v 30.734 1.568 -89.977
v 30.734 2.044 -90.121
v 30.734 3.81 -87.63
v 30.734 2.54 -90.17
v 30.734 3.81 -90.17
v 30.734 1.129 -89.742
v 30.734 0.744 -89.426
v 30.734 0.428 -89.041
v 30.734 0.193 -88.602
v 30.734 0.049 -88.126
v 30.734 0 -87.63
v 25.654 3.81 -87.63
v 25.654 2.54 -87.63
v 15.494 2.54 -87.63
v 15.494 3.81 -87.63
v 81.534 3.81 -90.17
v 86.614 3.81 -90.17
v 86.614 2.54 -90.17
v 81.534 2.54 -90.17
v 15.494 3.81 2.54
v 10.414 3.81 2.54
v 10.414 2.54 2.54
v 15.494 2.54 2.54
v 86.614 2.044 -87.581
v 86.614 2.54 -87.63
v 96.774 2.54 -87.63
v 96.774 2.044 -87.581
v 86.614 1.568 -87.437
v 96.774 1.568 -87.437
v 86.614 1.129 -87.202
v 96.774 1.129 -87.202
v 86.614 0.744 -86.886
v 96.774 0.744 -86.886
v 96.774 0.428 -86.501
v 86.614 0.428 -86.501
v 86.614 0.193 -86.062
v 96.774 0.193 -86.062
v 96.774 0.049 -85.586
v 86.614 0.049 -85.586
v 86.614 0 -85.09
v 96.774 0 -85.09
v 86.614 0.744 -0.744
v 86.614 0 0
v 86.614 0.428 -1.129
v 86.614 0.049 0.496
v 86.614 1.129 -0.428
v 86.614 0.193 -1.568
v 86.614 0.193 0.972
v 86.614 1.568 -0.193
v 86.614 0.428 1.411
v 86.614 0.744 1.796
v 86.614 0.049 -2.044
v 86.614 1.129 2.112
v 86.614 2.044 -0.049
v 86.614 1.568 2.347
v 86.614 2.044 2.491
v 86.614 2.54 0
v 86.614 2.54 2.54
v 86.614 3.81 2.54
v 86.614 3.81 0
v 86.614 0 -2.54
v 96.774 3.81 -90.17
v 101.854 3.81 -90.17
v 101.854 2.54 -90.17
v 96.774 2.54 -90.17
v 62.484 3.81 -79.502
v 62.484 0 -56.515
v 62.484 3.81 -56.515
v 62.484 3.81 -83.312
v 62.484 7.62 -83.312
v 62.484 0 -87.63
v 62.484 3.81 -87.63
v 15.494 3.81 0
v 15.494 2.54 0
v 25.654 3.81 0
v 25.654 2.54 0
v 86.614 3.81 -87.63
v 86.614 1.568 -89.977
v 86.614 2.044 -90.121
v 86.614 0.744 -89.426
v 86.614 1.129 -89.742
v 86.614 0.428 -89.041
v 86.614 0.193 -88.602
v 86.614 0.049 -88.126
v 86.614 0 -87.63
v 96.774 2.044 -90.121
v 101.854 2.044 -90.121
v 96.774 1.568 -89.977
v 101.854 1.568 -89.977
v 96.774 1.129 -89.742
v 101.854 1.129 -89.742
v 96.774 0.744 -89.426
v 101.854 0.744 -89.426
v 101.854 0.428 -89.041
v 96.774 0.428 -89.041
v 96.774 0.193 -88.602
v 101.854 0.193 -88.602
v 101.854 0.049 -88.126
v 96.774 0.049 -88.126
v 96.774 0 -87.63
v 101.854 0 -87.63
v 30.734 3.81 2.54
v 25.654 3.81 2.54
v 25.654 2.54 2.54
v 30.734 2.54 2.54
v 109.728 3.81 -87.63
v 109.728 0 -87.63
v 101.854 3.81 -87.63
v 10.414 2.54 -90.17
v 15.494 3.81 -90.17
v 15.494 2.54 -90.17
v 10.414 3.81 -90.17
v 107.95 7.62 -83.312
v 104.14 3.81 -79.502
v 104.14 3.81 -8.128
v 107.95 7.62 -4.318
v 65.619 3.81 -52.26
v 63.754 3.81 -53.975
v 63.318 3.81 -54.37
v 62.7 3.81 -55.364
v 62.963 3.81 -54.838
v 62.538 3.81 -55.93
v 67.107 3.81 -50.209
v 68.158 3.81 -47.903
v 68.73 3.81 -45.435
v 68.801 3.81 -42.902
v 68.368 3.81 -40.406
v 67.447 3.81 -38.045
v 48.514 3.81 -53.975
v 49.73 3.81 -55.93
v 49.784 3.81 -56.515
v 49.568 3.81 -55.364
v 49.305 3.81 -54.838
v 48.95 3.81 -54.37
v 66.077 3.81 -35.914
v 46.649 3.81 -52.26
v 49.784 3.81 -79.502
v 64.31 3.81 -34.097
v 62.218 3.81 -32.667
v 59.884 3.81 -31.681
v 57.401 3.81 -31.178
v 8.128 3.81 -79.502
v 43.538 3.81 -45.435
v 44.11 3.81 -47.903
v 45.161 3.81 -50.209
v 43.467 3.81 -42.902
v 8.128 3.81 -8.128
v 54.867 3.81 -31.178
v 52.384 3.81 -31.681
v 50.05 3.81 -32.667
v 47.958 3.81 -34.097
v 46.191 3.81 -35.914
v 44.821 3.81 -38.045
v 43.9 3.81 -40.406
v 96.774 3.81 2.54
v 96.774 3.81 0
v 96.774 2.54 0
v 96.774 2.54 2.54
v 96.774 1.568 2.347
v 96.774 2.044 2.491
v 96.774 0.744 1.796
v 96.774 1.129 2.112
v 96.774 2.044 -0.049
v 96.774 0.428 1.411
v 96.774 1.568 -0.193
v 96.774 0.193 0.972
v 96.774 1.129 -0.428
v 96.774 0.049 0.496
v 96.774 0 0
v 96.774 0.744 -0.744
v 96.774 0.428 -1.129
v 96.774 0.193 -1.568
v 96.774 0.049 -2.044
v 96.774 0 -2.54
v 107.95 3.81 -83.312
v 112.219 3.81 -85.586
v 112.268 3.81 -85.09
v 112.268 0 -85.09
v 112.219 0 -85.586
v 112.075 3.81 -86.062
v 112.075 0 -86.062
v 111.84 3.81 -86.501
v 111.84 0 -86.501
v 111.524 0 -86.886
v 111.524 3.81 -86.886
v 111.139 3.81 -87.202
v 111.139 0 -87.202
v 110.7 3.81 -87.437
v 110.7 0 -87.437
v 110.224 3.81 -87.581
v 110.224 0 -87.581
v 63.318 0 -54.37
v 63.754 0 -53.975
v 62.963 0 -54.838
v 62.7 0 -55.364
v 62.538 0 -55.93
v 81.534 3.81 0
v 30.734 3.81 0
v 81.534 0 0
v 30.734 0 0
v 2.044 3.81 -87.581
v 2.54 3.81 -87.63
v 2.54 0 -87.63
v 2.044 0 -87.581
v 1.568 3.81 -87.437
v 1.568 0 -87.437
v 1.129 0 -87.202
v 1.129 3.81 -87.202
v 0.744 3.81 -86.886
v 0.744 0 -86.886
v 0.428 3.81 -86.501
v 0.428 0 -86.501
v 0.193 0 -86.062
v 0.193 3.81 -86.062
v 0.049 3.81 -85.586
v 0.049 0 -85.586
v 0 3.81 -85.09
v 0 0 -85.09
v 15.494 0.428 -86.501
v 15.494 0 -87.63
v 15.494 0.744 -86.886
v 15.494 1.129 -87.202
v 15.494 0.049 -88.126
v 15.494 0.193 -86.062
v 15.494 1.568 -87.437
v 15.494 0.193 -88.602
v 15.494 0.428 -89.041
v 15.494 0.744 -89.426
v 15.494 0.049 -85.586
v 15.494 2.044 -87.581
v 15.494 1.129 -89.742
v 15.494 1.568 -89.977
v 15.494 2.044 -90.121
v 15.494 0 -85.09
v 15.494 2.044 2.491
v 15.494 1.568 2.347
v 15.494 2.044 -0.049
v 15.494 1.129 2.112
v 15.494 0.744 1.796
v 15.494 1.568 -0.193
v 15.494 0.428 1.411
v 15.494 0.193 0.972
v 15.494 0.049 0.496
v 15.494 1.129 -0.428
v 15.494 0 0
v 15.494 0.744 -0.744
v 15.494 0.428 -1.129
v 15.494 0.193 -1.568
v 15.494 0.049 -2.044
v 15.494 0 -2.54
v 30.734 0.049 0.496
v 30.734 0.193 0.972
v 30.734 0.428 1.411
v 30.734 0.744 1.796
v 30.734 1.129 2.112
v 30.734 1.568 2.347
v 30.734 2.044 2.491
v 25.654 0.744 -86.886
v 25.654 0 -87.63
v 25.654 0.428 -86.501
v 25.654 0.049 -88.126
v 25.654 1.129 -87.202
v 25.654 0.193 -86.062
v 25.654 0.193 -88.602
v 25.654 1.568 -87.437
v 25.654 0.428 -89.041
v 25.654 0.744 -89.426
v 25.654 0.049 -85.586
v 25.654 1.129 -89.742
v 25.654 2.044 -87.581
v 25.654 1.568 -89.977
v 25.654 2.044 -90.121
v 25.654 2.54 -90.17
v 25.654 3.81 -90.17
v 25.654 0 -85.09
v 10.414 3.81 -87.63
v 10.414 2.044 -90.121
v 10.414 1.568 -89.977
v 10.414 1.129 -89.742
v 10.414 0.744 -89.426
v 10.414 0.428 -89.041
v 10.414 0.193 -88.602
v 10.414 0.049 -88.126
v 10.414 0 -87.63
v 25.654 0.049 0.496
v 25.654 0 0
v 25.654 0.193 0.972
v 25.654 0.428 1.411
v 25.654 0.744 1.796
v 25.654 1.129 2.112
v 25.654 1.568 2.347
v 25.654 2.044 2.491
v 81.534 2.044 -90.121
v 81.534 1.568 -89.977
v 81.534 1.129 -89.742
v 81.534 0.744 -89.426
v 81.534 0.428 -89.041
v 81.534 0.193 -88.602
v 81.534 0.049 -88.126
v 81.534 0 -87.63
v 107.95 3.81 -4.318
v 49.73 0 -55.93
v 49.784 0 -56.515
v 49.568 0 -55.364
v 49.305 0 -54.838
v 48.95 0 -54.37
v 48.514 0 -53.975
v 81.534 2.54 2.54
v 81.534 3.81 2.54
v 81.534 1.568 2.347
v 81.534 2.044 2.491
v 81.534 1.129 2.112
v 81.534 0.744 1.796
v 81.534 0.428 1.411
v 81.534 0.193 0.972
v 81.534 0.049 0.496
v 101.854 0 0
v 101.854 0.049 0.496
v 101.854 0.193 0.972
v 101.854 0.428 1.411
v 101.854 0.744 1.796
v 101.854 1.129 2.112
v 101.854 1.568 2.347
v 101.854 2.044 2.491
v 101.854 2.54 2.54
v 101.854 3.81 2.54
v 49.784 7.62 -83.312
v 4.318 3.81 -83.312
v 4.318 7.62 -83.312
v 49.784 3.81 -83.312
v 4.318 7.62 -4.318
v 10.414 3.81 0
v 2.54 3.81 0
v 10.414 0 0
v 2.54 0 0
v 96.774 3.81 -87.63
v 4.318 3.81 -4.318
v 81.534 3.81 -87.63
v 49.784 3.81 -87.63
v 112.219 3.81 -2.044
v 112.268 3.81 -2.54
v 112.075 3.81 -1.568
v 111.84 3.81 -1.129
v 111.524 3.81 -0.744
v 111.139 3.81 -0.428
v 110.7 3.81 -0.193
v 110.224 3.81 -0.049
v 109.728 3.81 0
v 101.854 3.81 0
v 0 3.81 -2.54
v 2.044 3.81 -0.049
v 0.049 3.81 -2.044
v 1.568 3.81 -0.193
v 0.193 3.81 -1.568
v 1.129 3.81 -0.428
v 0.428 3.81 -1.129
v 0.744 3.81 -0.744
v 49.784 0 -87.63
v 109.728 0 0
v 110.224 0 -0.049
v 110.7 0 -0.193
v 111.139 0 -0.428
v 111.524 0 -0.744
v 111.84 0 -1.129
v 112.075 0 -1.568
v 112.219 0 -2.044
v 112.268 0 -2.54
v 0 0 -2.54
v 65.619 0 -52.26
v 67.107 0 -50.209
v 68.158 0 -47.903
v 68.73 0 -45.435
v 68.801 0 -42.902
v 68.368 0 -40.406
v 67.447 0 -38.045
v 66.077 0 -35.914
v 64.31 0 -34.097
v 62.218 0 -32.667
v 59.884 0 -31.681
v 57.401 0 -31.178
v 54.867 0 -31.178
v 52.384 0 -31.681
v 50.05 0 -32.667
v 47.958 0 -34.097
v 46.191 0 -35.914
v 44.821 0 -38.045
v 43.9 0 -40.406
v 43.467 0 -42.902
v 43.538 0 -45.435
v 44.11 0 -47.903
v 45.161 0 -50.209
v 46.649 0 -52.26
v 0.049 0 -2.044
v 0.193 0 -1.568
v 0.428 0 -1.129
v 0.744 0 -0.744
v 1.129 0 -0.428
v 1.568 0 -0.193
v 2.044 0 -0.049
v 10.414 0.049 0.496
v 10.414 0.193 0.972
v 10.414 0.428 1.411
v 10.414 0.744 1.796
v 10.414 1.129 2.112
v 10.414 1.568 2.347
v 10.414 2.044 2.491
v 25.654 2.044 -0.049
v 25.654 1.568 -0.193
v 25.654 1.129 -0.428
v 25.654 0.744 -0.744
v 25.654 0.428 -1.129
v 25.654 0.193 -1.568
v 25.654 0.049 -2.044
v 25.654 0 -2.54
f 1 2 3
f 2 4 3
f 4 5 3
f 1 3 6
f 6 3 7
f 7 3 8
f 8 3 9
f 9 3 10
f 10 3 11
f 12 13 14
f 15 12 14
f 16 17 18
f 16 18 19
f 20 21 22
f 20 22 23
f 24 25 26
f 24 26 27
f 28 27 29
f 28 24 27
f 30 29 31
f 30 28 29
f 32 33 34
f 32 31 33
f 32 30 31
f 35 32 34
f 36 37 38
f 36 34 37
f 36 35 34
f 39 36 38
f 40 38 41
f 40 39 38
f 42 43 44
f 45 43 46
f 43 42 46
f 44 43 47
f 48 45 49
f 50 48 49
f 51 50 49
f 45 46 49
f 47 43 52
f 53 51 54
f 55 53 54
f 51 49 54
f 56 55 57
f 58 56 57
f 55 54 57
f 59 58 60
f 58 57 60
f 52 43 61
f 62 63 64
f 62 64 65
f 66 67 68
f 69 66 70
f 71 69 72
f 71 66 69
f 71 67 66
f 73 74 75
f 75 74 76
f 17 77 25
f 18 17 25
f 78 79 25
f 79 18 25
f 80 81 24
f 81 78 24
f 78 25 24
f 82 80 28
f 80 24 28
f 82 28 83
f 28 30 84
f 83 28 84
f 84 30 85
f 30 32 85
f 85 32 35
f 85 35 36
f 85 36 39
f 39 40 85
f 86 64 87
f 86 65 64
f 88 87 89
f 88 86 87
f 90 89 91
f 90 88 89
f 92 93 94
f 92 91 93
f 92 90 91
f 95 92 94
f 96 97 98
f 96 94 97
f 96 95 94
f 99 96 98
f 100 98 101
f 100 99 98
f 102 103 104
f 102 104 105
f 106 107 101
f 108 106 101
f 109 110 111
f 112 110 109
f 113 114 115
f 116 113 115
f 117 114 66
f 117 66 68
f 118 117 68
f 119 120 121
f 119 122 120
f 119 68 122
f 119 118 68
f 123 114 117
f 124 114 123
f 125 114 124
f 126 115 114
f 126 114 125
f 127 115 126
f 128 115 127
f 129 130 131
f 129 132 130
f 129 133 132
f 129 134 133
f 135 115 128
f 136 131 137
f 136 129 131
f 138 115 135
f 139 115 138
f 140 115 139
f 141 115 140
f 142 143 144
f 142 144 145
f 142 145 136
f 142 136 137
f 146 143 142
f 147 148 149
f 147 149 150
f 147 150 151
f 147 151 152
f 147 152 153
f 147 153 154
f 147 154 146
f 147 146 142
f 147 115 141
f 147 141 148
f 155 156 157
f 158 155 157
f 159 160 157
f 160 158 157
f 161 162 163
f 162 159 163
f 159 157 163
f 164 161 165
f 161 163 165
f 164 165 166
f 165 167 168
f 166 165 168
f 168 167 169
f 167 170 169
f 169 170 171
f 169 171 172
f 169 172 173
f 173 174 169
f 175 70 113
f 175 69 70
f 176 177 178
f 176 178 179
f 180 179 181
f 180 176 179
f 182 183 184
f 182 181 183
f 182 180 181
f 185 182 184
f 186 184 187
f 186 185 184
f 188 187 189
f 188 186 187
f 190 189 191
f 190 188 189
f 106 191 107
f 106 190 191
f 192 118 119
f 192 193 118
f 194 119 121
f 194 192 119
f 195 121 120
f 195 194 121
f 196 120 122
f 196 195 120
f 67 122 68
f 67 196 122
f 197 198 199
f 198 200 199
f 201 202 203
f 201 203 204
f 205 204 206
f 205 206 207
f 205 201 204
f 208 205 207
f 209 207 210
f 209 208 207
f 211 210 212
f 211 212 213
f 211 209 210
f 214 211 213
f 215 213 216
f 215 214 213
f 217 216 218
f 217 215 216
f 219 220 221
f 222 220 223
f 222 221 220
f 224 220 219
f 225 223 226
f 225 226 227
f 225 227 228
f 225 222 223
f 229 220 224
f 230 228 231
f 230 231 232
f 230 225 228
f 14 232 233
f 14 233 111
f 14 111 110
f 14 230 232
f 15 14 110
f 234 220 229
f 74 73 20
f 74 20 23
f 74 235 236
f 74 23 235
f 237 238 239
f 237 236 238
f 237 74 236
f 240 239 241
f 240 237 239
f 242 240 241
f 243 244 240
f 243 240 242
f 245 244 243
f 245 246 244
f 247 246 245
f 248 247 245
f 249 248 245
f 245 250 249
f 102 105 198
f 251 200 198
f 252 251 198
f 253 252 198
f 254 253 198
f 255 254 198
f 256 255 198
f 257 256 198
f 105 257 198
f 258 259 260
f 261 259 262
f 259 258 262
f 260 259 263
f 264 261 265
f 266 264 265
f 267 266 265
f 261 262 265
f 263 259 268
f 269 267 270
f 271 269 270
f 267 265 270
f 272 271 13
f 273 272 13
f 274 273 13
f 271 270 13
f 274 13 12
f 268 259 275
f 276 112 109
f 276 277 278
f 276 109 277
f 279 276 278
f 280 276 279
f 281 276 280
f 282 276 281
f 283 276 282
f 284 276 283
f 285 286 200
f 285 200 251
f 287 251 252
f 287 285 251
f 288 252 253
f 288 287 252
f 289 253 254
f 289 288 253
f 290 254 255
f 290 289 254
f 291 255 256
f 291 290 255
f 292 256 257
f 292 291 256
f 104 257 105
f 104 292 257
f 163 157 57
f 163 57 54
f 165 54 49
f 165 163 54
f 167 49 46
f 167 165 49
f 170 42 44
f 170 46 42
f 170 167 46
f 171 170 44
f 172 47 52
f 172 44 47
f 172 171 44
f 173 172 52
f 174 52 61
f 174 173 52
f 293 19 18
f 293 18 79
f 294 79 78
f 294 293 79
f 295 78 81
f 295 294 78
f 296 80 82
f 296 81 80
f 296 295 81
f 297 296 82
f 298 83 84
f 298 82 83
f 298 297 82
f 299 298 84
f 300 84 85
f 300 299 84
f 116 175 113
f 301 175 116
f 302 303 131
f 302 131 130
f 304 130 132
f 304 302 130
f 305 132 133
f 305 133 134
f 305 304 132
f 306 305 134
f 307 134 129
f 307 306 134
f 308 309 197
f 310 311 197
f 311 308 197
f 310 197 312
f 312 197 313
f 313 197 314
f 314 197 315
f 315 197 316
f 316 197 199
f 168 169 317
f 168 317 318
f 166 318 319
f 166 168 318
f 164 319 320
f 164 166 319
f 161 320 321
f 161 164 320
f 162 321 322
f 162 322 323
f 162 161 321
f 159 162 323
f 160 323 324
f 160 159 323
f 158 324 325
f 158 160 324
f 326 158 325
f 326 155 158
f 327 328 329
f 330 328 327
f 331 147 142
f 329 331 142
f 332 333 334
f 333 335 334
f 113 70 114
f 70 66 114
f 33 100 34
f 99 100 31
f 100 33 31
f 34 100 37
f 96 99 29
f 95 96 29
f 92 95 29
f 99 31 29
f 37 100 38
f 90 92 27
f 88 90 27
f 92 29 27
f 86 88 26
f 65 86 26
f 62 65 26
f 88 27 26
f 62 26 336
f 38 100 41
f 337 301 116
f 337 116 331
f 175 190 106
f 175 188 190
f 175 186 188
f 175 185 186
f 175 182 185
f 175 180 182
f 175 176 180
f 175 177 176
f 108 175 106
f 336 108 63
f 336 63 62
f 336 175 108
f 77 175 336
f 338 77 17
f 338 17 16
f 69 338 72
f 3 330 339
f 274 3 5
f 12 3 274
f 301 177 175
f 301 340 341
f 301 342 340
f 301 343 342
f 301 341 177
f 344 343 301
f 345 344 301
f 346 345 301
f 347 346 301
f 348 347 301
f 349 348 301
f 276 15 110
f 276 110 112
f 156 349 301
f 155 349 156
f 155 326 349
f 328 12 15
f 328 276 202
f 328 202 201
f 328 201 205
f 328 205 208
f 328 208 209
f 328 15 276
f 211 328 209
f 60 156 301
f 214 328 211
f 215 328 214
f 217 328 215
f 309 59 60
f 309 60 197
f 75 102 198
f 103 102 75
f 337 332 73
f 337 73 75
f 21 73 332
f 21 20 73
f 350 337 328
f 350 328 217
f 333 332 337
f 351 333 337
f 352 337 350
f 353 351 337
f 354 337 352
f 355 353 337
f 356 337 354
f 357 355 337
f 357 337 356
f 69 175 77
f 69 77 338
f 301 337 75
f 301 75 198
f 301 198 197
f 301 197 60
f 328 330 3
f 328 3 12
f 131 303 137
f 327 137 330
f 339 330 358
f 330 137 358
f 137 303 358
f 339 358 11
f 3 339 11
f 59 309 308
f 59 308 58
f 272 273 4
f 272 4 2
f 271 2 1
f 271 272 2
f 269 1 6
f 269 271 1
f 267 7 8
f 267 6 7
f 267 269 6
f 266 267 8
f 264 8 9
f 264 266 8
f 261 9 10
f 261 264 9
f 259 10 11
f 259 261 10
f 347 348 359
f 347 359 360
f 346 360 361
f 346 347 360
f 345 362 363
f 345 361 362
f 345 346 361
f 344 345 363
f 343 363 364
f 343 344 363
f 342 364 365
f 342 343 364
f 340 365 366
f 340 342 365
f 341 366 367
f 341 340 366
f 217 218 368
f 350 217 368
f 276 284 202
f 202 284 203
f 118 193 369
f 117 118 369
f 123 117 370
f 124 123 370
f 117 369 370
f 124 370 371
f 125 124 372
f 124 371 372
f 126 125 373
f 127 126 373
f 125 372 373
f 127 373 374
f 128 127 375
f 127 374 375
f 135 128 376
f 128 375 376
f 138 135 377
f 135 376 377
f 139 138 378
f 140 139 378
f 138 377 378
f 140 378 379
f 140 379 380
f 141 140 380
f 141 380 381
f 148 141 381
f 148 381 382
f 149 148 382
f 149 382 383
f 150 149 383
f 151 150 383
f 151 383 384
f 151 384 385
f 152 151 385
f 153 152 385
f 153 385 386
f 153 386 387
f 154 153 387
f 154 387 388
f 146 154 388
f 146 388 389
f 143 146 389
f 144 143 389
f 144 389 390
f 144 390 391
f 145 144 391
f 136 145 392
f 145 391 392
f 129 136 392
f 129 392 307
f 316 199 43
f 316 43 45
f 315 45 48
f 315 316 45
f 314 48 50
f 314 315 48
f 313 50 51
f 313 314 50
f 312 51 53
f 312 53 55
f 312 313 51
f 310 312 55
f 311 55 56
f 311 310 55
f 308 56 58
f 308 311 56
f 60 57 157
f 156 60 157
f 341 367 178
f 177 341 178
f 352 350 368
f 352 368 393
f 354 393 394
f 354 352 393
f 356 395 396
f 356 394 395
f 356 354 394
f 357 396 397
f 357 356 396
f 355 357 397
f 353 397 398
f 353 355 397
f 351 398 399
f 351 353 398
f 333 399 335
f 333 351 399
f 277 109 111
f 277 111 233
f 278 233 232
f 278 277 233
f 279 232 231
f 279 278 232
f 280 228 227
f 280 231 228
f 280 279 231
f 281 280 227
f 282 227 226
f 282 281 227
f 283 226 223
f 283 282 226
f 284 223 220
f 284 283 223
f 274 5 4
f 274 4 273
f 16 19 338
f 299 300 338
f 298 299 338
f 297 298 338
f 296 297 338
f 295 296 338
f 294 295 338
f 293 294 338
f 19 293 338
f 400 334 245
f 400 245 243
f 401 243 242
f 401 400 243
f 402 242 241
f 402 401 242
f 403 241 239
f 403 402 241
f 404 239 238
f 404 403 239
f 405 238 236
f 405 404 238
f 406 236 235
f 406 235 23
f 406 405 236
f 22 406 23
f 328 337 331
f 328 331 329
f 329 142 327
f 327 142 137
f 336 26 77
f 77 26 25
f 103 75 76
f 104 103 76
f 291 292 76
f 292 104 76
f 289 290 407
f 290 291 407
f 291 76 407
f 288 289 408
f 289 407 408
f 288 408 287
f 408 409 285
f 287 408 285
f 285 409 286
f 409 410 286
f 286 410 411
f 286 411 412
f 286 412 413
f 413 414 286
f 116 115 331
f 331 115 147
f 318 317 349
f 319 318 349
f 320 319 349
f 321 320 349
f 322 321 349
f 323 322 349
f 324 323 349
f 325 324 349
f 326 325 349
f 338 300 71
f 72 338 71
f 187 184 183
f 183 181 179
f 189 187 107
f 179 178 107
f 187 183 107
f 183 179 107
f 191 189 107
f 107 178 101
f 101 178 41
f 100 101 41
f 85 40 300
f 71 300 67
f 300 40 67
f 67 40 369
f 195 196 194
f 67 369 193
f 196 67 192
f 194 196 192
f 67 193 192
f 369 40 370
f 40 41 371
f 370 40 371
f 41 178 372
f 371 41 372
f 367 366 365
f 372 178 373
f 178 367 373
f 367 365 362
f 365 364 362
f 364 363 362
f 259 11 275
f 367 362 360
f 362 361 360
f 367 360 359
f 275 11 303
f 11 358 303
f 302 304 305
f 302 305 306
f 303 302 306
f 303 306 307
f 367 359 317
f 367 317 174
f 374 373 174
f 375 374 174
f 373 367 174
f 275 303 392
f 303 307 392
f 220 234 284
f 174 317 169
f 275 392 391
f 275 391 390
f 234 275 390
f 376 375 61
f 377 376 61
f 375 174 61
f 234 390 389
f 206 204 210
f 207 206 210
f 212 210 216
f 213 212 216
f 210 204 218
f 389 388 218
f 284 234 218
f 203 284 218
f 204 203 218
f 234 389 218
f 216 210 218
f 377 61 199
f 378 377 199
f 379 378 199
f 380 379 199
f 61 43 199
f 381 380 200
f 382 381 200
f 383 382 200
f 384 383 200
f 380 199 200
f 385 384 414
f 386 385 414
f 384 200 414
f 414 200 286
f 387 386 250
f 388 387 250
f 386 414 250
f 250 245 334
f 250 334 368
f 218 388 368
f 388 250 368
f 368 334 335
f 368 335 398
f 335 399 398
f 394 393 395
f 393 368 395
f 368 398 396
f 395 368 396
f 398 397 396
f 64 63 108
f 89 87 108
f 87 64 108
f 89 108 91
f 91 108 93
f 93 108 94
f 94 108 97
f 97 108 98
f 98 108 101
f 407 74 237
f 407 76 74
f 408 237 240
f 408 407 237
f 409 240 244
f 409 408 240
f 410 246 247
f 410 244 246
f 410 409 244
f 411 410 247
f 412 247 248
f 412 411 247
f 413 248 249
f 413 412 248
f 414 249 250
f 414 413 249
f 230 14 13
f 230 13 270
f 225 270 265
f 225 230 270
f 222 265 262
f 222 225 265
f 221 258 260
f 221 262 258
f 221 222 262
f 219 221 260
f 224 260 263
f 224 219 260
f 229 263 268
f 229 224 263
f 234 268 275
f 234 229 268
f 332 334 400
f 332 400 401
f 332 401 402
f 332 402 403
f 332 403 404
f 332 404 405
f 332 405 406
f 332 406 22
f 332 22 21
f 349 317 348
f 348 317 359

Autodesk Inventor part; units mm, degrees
ref_plane "YZ Plane" through (0, 0, 0) normal (1, 0, 0) x (0, 1, 0)
ref_plane "XZ Plane" through (0, 0, 0) normal (0, 1, 0) x (-1, 0, 0)
sketch "Sketch1" plane through (0, 0, 0) normal (0, 1, 0) x (-1, 0, 0)
  line L0 (0, 0) -> (-112.268, 0)
  line L1 (-112.268, 0) -> (-112.268, -87.63)
  line L2 (-112.268, -87.63) -> (0, -87.63)
  line L3 (0, -87.63) -> (0, 0)
  dimension "d0" = 87.63
  dimension "d1" = 112.268
extrude "Extrusion1" add sketch "Sketch1" along normal blind 3.81
sketch "Sketch2" plane through (0, 3.81, 0) normal (0, 1, 0) x (1, 0, 0)
  line L0 (4.318, 83.312) -> (107.95, 83.312)
  line L1 (107.95, 83.312) -> (107.95, 4.318)
  line L2 (107.95, 4.318) -> (4.318, 4.318)
  line L3 (4.318, 4.318) -> (4.318, 83.312)
  line L4 (112.268, 87.63) -> (0, 87.63) projected
  line L5 (0, 87.63) -> (0, 0) projected
  line L6 (0, 0) -> (112.268, 0) projected
  line L7 (112.268, 0) -> (112.268, 87.63) projected
  line L8 (8.128, 79.502) -> (104.14, 79.502)
  line L9 (104.14, 79.502) -> (104.14, 8.128)
  line L10 (104.14, 8.128) -> (8.128, 8.128)
  line L11 (8.128, 8.128) -> (8.128, 79.502)
  dimension "d4" = 4.318
  dimension "d5" = 4.318
  dimension "d6" = 4.318
  dimension "d7" = 4.318
  dimension "d8" = 3.81
extrude "Extrusion2" add sketch "Sketch2" along normal blind 3.81 contours L0 L1 L2 L3
chamfer "Chamfer1" distance 3.81 angle 45 4 edges at (8.128, 7.62, -43.815) (56.134, 7.62, -79.502) (104.14, 7.62, -43.815) (56.134, 7.62, -8.128)
sketch "Sketch3" plane through (0, 0, 0) normal (0, -1, 0) x (1, 0, 0)
  arc A0 (63.754, -53.975) -> (48.514, -53.975) centre (56.134, -43.815) ccw
  line L0 (112.268, 0) -> (112.268, -87.63) projected
  line L1 (112.268, -87.63) -> (0, -87.63) projected
  line L2 (49.784, -56.515) -> (49.784, -87.63)
  line L3 (62.484, -56.515) -> (62.484, -87.63)
  arc A1 (49.784, -56.515) -> (48.514, -53.975) centre (46.609, -56.515) ccw
  arc A2 (63.754, -53.975) -> (62.484, -56.515) centre (65.659, -56.515) ccw
  point P0 (0, 0)
  point P1 (112.268, -43.815)
  point P2 (56.134, -87.63)
  point P3 (43.434, -43.815)
  point P4 (43.434, -87.63)
  point P5 (68.834, -43.815)
  point P6 (68.834, -87.63)
  point P7 (49.784, -54.8135)
  point P8 (62.484, -54.8135)
  point P9 (56.134, -87.63)
  dimension "d14" = 25.4
  dimension "d17" = 12.7
  dimension "d18" = 6.35
  dimension "d19" = 3.175
extrude "Extrusion3" cut sketch "Sketch3" against normal blind 62.865
fillet "Fillet1" radius 2.54 4 edges at (0, 1.905, -87.63) (112.268, 1.905, -87.63) (112.268, 1.905, 0) (0, 1.905, 0)
sketch "Sketch4" plane through (49.784, 0, -87.63) normal (0, 0, -1) x (-1, 0, 0)
  line L0 (0, 0) -> (47.244, 0) projected
  line L1 (45.466, 3.81) -> (0, 3.81) projected
  line L2 (39.37, 0) -> (34.29, 0)
  line L3 (34.29, 0) -> (34.29, 3.81)
  line L4 (34.29, 3.81) -> (39.37, 3.81)
  line L5 (39.37, 3.81) -> (39.37, 0)
  line L6 (24.13, 3.81) -> (19.05, 3.81)
  line L7 (19.05, 3.81) -> (19.05, 0)
  line L8 (19.05, 0) -> (24.13, 0)
  line L9 (24.13, 0) -> (24.13, 3.81)
  line L10 (-31.75, 3.81) -> (-36.83, 3.81)
  line L11 (-36.83, 3.81) -> (-36.83, 0)
  line L12 (-36.83, 0) -> (-31.75, 0)
  line L13 (-31.75, 0) -> (-31.75, 3.81)
  line L14 (-12.7, 3.81) -> (-58.166, 3.81) projected
  line L15 (-46.99, 3.81) -> (-52.07, 3.81)
  line L16 (-52.07, 3.81) -> (-52.07, 0)
  line L17 (-52.07, 0) -> (-46.99, 0)
  line L18 (-46.99, 0) -> (-46.99, 3.81)
  line L19 (45.466, 7.62) -> (-58.166, 7.62) projected
  point P0 (49.784, 0)
  point P1 (34.29, 1.905)
  point P2 (39.37, 1.905)
  point P3 (19.05, 1.905)
  point P4 (24.13, 1.905)
  point P5 (-36.83, 1.905)
  point P6 (-31.75, 1.905)
  point P7 (-52.07, 1.905)
  point P8 (-46.99, 1.905)
  point P9 (-6.35, 7.62)
  point P10 (-52.07, 3.81)
  point P11 (19.05, 3.81)
  point P12 (19.05, 0)
  dimension "d21" = 5.08
  dimension "d22" = 5.08
  dimension "d23" = 5.08
  dimension "d24" = 5.08
  dimension "d25" = 10.16
  dimension "d26" = 10.16
  dimension "d27" = 50.8
  dimension "d28" = 25.4
extrude "Extrusion4" add sketch "Sketch4" along normal blind 2.54 contours L7 L1 L9 L0 | L3 L1 L5 L0 | L13 L12 L11 L10 | L18 L17 L16 L14
ref_plane "Work Plane1" through (49.784, 0, -43.815) normal (0, 0, -1) x (-1, 0, 0)
mirror "Mirror1" about plane through (49.784, 0, -43.815) normal (0, 0, -1) of "Extrusion4"
fillet "Fillet2" radius 2.54 12 edges at (12.954, 0, -90.17) (20.574, 0, -87.63) (28.194, 0, -90.17) (91.694, 0, -87.63) (99.314, 0, -90.17) (84.074, 0, 2.54) (91.694, 0, 0) (99.314, 0, 2.54) (12.954, 0, 2.54) (20.574, 0, 0) (28.194, 0, 2.54) (84.074, 0, -90.17)
equation "\"d5\" = d4"
equation "\"d6\" = d4"
equation "\"d7\" = d4"
equation "\"d18\" = 0.5 * d17"
equation "\"d22\" = d21"
equation "\"d23\" = d22"
equation "\"d24\" = d23"
equation "\"d26\" = d25"
equation "\"d28\" = 0.5 * d27"
properties part number "Janus wire holder lid"
